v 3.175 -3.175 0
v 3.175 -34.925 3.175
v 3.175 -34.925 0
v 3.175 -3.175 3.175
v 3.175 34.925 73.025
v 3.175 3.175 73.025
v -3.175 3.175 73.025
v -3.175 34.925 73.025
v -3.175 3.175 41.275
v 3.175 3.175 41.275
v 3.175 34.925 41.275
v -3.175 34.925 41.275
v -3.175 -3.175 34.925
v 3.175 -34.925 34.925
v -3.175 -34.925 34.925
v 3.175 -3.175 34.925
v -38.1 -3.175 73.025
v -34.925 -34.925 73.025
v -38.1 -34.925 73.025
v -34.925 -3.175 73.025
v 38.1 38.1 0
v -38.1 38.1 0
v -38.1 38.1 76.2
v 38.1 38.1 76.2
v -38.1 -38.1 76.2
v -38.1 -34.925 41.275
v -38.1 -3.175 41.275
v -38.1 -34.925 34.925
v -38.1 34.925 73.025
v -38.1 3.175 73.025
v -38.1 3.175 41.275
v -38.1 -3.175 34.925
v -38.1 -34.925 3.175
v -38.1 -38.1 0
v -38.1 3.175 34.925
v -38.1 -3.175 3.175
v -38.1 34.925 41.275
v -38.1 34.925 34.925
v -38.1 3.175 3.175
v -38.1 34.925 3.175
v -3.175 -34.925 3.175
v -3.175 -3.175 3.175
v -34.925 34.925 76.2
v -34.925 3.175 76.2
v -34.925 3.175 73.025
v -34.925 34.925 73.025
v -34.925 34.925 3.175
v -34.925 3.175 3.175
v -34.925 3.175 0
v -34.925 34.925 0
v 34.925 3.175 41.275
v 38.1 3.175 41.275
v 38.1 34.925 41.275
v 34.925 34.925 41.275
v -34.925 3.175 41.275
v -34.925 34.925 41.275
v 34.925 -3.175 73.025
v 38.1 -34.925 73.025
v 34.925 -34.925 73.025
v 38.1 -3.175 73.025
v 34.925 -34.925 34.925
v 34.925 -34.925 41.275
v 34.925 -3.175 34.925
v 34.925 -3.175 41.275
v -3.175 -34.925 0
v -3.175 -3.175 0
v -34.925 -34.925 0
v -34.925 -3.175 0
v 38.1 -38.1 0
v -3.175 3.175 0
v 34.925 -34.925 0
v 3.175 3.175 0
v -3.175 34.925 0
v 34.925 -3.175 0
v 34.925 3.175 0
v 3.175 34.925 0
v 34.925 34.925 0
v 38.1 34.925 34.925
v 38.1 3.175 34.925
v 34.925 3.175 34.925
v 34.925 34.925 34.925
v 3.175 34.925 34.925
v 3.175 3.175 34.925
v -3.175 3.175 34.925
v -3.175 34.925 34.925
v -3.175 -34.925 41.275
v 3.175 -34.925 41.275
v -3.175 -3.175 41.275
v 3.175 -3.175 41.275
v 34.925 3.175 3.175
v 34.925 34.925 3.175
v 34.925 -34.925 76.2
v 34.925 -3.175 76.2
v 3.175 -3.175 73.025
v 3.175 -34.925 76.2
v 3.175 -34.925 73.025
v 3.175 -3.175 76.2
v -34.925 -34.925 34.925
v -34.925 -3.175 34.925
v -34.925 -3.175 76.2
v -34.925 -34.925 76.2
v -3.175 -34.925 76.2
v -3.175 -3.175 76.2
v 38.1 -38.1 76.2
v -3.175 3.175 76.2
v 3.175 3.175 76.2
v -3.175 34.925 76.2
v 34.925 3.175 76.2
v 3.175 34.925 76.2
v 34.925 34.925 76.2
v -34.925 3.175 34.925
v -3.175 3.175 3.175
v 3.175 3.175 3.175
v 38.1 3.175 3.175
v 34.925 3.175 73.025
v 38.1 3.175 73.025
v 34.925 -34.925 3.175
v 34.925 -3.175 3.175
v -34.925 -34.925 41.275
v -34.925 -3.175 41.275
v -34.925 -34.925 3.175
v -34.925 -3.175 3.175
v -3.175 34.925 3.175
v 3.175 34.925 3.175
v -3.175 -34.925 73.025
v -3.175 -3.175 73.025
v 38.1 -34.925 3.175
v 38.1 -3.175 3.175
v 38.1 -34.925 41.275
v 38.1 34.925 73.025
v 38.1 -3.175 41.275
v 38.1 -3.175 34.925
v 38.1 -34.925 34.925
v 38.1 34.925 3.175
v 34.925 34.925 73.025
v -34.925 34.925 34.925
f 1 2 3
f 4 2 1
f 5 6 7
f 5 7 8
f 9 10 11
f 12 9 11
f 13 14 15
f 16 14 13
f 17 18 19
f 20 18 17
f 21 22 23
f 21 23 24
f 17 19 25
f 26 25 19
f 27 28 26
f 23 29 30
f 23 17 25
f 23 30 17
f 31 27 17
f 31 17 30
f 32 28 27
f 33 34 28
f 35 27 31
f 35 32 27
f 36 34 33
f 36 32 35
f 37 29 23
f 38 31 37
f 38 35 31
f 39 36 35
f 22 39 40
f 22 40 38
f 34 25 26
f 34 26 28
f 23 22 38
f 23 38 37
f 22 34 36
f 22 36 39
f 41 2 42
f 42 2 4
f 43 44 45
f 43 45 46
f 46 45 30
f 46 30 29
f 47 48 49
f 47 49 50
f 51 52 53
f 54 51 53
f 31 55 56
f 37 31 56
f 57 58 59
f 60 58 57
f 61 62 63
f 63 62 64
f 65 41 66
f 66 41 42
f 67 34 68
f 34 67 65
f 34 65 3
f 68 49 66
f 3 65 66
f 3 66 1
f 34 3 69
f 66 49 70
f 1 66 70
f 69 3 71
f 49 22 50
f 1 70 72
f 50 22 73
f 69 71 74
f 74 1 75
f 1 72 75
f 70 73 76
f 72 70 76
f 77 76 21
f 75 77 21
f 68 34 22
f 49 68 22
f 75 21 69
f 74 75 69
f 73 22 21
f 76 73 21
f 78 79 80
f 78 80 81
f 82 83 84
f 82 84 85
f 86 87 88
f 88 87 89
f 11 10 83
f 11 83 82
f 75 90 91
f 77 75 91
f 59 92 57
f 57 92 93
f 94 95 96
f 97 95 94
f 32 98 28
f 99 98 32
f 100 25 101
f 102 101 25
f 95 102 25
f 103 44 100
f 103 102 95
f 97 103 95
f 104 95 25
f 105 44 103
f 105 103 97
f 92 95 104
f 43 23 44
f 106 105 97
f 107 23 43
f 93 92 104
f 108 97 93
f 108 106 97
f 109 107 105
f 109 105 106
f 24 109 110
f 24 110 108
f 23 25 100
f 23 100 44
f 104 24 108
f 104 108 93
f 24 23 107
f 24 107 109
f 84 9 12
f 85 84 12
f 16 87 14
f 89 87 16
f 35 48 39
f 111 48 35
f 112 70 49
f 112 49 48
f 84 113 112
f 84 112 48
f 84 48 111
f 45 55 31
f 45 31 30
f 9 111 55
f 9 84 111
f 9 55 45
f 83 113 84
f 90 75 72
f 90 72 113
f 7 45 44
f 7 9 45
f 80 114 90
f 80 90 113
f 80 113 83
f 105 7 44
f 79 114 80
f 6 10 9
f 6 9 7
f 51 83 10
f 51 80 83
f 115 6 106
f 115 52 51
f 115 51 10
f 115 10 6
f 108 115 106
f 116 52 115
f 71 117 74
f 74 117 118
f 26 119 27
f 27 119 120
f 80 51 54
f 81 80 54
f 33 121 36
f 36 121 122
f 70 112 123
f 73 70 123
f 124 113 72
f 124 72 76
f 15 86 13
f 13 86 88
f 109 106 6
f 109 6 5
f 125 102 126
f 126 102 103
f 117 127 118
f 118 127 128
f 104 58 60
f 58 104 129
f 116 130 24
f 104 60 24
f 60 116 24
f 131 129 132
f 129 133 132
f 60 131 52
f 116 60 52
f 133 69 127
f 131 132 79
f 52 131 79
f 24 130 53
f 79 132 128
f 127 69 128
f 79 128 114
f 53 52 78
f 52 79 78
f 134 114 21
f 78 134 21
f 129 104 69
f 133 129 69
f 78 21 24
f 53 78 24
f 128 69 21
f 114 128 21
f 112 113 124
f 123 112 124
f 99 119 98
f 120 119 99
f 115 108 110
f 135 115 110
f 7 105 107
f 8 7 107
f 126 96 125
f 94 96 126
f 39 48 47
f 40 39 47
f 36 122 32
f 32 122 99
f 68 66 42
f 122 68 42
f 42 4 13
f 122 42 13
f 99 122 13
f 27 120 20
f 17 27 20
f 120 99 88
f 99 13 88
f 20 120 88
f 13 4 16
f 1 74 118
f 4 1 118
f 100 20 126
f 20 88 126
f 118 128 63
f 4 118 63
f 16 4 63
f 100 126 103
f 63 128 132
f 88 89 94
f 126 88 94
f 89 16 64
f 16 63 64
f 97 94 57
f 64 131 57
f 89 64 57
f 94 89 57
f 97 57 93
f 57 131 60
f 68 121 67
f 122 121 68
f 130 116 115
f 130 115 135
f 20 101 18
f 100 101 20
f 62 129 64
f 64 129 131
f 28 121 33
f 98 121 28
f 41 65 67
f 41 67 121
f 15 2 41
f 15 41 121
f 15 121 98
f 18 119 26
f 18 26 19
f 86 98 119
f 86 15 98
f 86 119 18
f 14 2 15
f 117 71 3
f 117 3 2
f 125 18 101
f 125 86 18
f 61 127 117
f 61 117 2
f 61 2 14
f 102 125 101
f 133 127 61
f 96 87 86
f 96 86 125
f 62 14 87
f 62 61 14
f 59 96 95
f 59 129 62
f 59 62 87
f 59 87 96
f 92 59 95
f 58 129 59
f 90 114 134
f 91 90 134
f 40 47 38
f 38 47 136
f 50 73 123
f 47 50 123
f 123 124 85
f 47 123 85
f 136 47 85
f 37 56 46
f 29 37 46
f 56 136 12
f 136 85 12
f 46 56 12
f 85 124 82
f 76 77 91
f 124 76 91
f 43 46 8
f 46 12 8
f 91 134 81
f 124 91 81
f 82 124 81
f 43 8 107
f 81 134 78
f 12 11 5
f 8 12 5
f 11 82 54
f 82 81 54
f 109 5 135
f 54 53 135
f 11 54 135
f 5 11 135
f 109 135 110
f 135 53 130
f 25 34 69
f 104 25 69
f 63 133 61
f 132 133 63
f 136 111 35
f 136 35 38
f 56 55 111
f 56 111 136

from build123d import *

# Parameters (mm, degrees)
F0_W     = 76.2
F0_H     = 76.2
F1_DEPTH = 76.2
F2_W     = 31.75
F2_H     = 31.75
F3_DEPTH = 102.87
F4_DEPTH = 134.874
F5_DEPTH = 137.922
F6_DEPTH = 121.412
F7_W     = 31.75
F7_H     = 31.75
F8_DEPTH = 107.696


with BuildPart() as f1:
    # F0 (on Top) → F1 (new body)
    with BuildSketch(Plane.XY):
        Rectangle(F0_W, F0_H)
    extrude(amount=F1_DEPTH)

    # F2 (on face) → F3 (cut)
    with BuildSketch(Plane.XY.offset(76.2)):
        with Locations((-19.05, 19.05)):
            Rectangle(F2_W, F2_H)
    extrude(amount=-F3_DEPTH, mode=Mode.SUBTRACT)

    # F2 (on face) → F4 (cut)
    with BuildSketch(Plane.XY.offset(76.2)):
        with Locations((19.05, 19.05)):
            Rectangle(F2_W, F2_H)
    extrude(amount=-F4_DEPTH, mode=Mode.SUBTRACT)

    # F2 (on face) → F5 (cut)
    with BuildSketch(Plane.XY.offset(76.2)):
        with Locations((-19.05, -19.05)):
            Rectangle(F2_W, F2_H)
    extrude(amount=-F5_DEPTH, mode=Mode.SUBTRACT)

    # F2 (on face) → F6 (cut)
    with BuildSketch(Plane.XY.offset(76.2)):
        with Locations((19.05, -19.05)):
            Rectangle(F2_W, F2_H)
    extrude(amount=-F6_DEPTH, mode=Mode.SUBTRACT)

    # F7 (on face) → F8 (cut)
    with BuildSketch(Plane.YZ.offset(38.1)):
        with Locations((-19.05, 57.15)):
            Rectangle(F7_W, F7_H)
        with Locations((19.05, 57.15)):
            Rectangle(F7_W, F7_H)
        with Locations((-19.05, 19.05)):
            Rectangle(F7_W, F7_H)
        with Locations((19.05, 19.05)):
            Rectangle(F7_W, F7_H)
    extrude(amount=-F8_DEPTH, mode=Mode.SUBTRACT)


solid = f1.part
